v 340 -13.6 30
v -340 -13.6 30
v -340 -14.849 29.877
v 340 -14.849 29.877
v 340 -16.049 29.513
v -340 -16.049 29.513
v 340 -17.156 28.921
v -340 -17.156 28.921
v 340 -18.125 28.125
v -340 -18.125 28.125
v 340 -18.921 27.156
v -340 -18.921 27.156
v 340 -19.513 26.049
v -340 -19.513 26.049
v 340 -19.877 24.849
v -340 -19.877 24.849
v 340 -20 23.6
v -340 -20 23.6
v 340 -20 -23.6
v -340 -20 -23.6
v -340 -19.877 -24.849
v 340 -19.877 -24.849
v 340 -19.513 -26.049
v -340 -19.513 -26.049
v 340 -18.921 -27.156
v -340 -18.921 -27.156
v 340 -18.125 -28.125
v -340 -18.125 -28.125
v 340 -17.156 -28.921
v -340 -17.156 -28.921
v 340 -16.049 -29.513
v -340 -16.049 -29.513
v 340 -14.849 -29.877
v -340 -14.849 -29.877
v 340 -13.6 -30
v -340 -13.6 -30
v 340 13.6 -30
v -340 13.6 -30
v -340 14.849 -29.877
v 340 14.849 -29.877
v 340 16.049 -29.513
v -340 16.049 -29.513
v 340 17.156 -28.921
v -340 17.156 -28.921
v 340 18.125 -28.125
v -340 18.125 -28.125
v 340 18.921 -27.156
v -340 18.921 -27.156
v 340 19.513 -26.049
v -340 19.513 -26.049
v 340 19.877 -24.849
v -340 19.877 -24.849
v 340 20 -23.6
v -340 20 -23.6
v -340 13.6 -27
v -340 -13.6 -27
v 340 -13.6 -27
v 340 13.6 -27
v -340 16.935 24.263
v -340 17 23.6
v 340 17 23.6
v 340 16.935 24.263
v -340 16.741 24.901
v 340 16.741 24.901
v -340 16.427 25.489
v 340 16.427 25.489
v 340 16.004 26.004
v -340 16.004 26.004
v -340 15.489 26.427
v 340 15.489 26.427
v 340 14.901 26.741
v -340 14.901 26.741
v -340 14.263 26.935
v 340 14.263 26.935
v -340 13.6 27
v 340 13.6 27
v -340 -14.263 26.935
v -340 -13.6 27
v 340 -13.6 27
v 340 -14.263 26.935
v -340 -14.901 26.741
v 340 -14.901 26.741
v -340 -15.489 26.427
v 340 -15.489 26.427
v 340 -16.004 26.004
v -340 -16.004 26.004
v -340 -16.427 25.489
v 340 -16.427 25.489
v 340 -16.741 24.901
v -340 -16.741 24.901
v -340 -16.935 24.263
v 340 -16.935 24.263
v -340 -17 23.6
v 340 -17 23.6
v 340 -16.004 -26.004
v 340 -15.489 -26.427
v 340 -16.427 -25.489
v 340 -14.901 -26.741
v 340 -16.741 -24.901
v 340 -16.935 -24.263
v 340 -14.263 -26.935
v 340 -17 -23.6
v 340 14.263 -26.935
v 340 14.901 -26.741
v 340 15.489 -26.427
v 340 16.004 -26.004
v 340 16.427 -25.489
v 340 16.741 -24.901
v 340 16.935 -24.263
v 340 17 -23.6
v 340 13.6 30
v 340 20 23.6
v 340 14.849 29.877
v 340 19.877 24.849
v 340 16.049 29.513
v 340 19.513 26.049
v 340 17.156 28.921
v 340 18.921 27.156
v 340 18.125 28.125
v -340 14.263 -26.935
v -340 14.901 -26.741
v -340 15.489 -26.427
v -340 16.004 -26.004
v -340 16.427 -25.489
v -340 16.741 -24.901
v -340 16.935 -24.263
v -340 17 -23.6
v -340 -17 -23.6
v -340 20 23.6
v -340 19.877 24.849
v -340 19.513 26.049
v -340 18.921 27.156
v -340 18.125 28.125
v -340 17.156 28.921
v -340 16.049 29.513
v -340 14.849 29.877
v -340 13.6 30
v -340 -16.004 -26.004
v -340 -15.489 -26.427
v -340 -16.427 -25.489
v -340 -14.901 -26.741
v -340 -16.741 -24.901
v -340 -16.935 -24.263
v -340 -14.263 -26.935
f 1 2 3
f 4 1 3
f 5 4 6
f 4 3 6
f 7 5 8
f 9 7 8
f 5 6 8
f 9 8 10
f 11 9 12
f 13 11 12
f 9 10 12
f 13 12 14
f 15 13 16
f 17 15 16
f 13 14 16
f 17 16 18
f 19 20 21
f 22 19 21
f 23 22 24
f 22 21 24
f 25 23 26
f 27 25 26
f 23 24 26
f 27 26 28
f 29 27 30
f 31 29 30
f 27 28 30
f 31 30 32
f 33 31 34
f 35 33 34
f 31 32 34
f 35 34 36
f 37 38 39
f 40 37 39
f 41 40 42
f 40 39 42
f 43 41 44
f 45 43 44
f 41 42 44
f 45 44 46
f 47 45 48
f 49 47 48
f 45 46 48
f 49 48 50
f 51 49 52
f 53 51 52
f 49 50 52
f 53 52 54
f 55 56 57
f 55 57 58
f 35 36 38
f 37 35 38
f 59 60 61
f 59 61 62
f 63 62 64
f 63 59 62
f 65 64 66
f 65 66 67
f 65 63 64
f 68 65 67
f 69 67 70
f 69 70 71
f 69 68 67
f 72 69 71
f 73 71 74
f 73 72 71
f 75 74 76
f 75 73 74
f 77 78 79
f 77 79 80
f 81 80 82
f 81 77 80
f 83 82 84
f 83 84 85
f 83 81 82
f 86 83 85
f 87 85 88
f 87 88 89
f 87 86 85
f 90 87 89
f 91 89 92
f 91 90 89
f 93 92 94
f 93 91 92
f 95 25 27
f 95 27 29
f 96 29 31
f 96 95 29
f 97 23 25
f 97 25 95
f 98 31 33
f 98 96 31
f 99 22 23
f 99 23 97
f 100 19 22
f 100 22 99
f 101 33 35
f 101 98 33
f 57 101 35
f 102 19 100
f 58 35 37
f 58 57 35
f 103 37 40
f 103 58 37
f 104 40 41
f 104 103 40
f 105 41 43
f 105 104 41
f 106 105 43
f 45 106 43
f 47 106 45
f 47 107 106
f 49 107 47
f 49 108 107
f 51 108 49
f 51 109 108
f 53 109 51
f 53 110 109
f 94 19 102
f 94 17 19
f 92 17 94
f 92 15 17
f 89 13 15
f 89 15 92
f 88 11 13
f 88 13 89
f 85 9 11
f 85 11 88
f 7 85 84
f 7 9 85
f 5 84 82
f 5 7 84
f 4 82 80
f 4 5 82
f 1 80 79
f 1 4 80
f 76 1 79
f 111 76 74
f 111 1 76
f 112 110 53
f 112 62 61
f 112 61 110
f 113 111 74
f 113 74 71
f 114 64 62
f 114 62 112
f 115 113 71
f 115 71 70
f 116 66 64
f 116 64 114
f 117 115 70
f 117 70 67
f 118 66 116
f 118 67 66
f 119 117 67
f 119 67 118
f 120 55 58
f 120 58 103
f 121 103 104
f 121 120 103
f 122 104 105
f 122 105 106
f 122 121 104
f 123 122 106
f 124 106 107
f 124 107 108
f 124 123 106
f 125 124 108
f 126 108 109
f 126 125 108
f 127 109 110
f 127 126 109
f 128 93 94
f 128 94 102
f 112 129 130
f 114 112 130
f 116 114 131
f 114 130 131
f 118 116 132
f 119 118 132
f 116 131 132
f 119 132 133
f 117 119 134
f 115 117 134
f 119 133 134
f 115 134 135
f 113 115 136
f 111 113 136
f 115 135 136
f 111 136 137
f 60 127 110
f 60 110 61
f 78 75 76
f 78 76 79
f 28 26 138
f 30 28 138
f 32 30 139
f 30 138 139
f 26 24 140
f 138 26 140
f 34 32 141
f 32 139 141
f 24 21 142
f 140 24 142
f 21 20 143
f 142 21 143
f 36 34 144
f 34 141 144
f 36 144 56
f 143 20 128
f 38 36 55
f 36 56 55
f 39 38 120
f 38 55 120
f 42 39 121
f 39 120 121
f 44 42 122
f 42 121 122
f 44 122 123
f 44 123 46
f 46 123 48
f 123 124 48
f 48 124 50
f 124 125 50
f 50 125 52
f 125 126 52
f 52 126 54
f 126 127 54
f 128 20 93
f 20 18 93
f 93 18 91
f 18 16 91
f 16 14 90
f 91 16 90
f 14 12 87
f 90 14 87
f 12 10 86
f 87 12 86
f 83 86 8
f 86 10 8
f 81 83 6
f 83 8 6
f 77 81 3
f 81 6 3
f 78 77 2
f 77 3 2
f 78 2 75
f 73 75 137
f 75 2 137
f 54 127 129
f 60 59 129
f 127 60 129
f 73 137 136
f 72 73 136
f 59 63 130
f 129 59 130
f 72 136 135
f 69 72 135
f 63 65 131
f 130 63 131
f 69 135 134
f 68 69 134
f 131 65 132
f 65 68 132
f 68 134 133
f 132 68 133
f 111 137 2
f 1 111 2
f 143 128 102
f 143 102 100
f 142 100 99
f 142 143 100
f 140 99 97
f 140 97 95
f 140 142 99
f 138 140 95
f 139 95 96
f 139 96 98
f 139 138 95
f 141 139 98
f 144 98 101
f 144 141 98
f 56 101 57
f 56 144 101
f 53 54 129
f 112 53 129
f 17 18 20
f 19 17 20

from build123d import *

# Parameters (mm, degrees)
RECTANGULAR_TUBE_CONFIGURED_60_X_40_X_DEPTH = 680


with BuildPart() as part:
    # Sketch1 → Rectangular tube - configured 60 X 40 X 3.2(2) (new body)
    with BuildSketch(Plane.YZ.offset(-340)):
        with BuildLine():
            Line((-13.6, -30), (13.6, -30))
            ThreePointArc((13.6, -30), (18.1254834, -28.1254834), (20, -23.6))
            Line((20, -23.6), (20, 23.6))
            ThreePointArc((20, 23.6), (18.1254834, 28.1254834), (13.6, 30))
            Line((13.6, 30), (-13.6, 30))
            ThreePointArc((-13.6, 30), (-18.1254834, 28.1254834), (-20, 23.6))
            Line((-20, 23.6), (-20, -23.6))
            ThreePointArc((-20, -23.6), (-18.1254834, -28.1254834), (-13.6, -30))
        make_face()
        with BuildLine():
            Line((-13.6, -27), (13.6, -27))
            ThreePointArc((13.6, -27), (16.004163056, -26.004163056), (17, -23.6))
            Line((17, -23.6), (17, 23.6))
            ThreePointArc((17, 23.6), (16.004163056, 26.004163056), (13.6, 27))
            Line((13.6, 27), (-13.6, 27))
            ThreePointArc((-13.6, 27), (-16.004163056, 26.004163056), (-17, 23.6))
            Line((-17, 23.6), (-17, -23.6))
            ThreePointArc((-17, -23.6), (-16.004163056, -26.004163056), (-13.6, -27))
        make_face(mode=Mode.SUBTRACT)
    extrude(amount=RECTANGULAR_TUBE_CONFIGURED_60_X_40_X_DEPTH)


solid = part.part
